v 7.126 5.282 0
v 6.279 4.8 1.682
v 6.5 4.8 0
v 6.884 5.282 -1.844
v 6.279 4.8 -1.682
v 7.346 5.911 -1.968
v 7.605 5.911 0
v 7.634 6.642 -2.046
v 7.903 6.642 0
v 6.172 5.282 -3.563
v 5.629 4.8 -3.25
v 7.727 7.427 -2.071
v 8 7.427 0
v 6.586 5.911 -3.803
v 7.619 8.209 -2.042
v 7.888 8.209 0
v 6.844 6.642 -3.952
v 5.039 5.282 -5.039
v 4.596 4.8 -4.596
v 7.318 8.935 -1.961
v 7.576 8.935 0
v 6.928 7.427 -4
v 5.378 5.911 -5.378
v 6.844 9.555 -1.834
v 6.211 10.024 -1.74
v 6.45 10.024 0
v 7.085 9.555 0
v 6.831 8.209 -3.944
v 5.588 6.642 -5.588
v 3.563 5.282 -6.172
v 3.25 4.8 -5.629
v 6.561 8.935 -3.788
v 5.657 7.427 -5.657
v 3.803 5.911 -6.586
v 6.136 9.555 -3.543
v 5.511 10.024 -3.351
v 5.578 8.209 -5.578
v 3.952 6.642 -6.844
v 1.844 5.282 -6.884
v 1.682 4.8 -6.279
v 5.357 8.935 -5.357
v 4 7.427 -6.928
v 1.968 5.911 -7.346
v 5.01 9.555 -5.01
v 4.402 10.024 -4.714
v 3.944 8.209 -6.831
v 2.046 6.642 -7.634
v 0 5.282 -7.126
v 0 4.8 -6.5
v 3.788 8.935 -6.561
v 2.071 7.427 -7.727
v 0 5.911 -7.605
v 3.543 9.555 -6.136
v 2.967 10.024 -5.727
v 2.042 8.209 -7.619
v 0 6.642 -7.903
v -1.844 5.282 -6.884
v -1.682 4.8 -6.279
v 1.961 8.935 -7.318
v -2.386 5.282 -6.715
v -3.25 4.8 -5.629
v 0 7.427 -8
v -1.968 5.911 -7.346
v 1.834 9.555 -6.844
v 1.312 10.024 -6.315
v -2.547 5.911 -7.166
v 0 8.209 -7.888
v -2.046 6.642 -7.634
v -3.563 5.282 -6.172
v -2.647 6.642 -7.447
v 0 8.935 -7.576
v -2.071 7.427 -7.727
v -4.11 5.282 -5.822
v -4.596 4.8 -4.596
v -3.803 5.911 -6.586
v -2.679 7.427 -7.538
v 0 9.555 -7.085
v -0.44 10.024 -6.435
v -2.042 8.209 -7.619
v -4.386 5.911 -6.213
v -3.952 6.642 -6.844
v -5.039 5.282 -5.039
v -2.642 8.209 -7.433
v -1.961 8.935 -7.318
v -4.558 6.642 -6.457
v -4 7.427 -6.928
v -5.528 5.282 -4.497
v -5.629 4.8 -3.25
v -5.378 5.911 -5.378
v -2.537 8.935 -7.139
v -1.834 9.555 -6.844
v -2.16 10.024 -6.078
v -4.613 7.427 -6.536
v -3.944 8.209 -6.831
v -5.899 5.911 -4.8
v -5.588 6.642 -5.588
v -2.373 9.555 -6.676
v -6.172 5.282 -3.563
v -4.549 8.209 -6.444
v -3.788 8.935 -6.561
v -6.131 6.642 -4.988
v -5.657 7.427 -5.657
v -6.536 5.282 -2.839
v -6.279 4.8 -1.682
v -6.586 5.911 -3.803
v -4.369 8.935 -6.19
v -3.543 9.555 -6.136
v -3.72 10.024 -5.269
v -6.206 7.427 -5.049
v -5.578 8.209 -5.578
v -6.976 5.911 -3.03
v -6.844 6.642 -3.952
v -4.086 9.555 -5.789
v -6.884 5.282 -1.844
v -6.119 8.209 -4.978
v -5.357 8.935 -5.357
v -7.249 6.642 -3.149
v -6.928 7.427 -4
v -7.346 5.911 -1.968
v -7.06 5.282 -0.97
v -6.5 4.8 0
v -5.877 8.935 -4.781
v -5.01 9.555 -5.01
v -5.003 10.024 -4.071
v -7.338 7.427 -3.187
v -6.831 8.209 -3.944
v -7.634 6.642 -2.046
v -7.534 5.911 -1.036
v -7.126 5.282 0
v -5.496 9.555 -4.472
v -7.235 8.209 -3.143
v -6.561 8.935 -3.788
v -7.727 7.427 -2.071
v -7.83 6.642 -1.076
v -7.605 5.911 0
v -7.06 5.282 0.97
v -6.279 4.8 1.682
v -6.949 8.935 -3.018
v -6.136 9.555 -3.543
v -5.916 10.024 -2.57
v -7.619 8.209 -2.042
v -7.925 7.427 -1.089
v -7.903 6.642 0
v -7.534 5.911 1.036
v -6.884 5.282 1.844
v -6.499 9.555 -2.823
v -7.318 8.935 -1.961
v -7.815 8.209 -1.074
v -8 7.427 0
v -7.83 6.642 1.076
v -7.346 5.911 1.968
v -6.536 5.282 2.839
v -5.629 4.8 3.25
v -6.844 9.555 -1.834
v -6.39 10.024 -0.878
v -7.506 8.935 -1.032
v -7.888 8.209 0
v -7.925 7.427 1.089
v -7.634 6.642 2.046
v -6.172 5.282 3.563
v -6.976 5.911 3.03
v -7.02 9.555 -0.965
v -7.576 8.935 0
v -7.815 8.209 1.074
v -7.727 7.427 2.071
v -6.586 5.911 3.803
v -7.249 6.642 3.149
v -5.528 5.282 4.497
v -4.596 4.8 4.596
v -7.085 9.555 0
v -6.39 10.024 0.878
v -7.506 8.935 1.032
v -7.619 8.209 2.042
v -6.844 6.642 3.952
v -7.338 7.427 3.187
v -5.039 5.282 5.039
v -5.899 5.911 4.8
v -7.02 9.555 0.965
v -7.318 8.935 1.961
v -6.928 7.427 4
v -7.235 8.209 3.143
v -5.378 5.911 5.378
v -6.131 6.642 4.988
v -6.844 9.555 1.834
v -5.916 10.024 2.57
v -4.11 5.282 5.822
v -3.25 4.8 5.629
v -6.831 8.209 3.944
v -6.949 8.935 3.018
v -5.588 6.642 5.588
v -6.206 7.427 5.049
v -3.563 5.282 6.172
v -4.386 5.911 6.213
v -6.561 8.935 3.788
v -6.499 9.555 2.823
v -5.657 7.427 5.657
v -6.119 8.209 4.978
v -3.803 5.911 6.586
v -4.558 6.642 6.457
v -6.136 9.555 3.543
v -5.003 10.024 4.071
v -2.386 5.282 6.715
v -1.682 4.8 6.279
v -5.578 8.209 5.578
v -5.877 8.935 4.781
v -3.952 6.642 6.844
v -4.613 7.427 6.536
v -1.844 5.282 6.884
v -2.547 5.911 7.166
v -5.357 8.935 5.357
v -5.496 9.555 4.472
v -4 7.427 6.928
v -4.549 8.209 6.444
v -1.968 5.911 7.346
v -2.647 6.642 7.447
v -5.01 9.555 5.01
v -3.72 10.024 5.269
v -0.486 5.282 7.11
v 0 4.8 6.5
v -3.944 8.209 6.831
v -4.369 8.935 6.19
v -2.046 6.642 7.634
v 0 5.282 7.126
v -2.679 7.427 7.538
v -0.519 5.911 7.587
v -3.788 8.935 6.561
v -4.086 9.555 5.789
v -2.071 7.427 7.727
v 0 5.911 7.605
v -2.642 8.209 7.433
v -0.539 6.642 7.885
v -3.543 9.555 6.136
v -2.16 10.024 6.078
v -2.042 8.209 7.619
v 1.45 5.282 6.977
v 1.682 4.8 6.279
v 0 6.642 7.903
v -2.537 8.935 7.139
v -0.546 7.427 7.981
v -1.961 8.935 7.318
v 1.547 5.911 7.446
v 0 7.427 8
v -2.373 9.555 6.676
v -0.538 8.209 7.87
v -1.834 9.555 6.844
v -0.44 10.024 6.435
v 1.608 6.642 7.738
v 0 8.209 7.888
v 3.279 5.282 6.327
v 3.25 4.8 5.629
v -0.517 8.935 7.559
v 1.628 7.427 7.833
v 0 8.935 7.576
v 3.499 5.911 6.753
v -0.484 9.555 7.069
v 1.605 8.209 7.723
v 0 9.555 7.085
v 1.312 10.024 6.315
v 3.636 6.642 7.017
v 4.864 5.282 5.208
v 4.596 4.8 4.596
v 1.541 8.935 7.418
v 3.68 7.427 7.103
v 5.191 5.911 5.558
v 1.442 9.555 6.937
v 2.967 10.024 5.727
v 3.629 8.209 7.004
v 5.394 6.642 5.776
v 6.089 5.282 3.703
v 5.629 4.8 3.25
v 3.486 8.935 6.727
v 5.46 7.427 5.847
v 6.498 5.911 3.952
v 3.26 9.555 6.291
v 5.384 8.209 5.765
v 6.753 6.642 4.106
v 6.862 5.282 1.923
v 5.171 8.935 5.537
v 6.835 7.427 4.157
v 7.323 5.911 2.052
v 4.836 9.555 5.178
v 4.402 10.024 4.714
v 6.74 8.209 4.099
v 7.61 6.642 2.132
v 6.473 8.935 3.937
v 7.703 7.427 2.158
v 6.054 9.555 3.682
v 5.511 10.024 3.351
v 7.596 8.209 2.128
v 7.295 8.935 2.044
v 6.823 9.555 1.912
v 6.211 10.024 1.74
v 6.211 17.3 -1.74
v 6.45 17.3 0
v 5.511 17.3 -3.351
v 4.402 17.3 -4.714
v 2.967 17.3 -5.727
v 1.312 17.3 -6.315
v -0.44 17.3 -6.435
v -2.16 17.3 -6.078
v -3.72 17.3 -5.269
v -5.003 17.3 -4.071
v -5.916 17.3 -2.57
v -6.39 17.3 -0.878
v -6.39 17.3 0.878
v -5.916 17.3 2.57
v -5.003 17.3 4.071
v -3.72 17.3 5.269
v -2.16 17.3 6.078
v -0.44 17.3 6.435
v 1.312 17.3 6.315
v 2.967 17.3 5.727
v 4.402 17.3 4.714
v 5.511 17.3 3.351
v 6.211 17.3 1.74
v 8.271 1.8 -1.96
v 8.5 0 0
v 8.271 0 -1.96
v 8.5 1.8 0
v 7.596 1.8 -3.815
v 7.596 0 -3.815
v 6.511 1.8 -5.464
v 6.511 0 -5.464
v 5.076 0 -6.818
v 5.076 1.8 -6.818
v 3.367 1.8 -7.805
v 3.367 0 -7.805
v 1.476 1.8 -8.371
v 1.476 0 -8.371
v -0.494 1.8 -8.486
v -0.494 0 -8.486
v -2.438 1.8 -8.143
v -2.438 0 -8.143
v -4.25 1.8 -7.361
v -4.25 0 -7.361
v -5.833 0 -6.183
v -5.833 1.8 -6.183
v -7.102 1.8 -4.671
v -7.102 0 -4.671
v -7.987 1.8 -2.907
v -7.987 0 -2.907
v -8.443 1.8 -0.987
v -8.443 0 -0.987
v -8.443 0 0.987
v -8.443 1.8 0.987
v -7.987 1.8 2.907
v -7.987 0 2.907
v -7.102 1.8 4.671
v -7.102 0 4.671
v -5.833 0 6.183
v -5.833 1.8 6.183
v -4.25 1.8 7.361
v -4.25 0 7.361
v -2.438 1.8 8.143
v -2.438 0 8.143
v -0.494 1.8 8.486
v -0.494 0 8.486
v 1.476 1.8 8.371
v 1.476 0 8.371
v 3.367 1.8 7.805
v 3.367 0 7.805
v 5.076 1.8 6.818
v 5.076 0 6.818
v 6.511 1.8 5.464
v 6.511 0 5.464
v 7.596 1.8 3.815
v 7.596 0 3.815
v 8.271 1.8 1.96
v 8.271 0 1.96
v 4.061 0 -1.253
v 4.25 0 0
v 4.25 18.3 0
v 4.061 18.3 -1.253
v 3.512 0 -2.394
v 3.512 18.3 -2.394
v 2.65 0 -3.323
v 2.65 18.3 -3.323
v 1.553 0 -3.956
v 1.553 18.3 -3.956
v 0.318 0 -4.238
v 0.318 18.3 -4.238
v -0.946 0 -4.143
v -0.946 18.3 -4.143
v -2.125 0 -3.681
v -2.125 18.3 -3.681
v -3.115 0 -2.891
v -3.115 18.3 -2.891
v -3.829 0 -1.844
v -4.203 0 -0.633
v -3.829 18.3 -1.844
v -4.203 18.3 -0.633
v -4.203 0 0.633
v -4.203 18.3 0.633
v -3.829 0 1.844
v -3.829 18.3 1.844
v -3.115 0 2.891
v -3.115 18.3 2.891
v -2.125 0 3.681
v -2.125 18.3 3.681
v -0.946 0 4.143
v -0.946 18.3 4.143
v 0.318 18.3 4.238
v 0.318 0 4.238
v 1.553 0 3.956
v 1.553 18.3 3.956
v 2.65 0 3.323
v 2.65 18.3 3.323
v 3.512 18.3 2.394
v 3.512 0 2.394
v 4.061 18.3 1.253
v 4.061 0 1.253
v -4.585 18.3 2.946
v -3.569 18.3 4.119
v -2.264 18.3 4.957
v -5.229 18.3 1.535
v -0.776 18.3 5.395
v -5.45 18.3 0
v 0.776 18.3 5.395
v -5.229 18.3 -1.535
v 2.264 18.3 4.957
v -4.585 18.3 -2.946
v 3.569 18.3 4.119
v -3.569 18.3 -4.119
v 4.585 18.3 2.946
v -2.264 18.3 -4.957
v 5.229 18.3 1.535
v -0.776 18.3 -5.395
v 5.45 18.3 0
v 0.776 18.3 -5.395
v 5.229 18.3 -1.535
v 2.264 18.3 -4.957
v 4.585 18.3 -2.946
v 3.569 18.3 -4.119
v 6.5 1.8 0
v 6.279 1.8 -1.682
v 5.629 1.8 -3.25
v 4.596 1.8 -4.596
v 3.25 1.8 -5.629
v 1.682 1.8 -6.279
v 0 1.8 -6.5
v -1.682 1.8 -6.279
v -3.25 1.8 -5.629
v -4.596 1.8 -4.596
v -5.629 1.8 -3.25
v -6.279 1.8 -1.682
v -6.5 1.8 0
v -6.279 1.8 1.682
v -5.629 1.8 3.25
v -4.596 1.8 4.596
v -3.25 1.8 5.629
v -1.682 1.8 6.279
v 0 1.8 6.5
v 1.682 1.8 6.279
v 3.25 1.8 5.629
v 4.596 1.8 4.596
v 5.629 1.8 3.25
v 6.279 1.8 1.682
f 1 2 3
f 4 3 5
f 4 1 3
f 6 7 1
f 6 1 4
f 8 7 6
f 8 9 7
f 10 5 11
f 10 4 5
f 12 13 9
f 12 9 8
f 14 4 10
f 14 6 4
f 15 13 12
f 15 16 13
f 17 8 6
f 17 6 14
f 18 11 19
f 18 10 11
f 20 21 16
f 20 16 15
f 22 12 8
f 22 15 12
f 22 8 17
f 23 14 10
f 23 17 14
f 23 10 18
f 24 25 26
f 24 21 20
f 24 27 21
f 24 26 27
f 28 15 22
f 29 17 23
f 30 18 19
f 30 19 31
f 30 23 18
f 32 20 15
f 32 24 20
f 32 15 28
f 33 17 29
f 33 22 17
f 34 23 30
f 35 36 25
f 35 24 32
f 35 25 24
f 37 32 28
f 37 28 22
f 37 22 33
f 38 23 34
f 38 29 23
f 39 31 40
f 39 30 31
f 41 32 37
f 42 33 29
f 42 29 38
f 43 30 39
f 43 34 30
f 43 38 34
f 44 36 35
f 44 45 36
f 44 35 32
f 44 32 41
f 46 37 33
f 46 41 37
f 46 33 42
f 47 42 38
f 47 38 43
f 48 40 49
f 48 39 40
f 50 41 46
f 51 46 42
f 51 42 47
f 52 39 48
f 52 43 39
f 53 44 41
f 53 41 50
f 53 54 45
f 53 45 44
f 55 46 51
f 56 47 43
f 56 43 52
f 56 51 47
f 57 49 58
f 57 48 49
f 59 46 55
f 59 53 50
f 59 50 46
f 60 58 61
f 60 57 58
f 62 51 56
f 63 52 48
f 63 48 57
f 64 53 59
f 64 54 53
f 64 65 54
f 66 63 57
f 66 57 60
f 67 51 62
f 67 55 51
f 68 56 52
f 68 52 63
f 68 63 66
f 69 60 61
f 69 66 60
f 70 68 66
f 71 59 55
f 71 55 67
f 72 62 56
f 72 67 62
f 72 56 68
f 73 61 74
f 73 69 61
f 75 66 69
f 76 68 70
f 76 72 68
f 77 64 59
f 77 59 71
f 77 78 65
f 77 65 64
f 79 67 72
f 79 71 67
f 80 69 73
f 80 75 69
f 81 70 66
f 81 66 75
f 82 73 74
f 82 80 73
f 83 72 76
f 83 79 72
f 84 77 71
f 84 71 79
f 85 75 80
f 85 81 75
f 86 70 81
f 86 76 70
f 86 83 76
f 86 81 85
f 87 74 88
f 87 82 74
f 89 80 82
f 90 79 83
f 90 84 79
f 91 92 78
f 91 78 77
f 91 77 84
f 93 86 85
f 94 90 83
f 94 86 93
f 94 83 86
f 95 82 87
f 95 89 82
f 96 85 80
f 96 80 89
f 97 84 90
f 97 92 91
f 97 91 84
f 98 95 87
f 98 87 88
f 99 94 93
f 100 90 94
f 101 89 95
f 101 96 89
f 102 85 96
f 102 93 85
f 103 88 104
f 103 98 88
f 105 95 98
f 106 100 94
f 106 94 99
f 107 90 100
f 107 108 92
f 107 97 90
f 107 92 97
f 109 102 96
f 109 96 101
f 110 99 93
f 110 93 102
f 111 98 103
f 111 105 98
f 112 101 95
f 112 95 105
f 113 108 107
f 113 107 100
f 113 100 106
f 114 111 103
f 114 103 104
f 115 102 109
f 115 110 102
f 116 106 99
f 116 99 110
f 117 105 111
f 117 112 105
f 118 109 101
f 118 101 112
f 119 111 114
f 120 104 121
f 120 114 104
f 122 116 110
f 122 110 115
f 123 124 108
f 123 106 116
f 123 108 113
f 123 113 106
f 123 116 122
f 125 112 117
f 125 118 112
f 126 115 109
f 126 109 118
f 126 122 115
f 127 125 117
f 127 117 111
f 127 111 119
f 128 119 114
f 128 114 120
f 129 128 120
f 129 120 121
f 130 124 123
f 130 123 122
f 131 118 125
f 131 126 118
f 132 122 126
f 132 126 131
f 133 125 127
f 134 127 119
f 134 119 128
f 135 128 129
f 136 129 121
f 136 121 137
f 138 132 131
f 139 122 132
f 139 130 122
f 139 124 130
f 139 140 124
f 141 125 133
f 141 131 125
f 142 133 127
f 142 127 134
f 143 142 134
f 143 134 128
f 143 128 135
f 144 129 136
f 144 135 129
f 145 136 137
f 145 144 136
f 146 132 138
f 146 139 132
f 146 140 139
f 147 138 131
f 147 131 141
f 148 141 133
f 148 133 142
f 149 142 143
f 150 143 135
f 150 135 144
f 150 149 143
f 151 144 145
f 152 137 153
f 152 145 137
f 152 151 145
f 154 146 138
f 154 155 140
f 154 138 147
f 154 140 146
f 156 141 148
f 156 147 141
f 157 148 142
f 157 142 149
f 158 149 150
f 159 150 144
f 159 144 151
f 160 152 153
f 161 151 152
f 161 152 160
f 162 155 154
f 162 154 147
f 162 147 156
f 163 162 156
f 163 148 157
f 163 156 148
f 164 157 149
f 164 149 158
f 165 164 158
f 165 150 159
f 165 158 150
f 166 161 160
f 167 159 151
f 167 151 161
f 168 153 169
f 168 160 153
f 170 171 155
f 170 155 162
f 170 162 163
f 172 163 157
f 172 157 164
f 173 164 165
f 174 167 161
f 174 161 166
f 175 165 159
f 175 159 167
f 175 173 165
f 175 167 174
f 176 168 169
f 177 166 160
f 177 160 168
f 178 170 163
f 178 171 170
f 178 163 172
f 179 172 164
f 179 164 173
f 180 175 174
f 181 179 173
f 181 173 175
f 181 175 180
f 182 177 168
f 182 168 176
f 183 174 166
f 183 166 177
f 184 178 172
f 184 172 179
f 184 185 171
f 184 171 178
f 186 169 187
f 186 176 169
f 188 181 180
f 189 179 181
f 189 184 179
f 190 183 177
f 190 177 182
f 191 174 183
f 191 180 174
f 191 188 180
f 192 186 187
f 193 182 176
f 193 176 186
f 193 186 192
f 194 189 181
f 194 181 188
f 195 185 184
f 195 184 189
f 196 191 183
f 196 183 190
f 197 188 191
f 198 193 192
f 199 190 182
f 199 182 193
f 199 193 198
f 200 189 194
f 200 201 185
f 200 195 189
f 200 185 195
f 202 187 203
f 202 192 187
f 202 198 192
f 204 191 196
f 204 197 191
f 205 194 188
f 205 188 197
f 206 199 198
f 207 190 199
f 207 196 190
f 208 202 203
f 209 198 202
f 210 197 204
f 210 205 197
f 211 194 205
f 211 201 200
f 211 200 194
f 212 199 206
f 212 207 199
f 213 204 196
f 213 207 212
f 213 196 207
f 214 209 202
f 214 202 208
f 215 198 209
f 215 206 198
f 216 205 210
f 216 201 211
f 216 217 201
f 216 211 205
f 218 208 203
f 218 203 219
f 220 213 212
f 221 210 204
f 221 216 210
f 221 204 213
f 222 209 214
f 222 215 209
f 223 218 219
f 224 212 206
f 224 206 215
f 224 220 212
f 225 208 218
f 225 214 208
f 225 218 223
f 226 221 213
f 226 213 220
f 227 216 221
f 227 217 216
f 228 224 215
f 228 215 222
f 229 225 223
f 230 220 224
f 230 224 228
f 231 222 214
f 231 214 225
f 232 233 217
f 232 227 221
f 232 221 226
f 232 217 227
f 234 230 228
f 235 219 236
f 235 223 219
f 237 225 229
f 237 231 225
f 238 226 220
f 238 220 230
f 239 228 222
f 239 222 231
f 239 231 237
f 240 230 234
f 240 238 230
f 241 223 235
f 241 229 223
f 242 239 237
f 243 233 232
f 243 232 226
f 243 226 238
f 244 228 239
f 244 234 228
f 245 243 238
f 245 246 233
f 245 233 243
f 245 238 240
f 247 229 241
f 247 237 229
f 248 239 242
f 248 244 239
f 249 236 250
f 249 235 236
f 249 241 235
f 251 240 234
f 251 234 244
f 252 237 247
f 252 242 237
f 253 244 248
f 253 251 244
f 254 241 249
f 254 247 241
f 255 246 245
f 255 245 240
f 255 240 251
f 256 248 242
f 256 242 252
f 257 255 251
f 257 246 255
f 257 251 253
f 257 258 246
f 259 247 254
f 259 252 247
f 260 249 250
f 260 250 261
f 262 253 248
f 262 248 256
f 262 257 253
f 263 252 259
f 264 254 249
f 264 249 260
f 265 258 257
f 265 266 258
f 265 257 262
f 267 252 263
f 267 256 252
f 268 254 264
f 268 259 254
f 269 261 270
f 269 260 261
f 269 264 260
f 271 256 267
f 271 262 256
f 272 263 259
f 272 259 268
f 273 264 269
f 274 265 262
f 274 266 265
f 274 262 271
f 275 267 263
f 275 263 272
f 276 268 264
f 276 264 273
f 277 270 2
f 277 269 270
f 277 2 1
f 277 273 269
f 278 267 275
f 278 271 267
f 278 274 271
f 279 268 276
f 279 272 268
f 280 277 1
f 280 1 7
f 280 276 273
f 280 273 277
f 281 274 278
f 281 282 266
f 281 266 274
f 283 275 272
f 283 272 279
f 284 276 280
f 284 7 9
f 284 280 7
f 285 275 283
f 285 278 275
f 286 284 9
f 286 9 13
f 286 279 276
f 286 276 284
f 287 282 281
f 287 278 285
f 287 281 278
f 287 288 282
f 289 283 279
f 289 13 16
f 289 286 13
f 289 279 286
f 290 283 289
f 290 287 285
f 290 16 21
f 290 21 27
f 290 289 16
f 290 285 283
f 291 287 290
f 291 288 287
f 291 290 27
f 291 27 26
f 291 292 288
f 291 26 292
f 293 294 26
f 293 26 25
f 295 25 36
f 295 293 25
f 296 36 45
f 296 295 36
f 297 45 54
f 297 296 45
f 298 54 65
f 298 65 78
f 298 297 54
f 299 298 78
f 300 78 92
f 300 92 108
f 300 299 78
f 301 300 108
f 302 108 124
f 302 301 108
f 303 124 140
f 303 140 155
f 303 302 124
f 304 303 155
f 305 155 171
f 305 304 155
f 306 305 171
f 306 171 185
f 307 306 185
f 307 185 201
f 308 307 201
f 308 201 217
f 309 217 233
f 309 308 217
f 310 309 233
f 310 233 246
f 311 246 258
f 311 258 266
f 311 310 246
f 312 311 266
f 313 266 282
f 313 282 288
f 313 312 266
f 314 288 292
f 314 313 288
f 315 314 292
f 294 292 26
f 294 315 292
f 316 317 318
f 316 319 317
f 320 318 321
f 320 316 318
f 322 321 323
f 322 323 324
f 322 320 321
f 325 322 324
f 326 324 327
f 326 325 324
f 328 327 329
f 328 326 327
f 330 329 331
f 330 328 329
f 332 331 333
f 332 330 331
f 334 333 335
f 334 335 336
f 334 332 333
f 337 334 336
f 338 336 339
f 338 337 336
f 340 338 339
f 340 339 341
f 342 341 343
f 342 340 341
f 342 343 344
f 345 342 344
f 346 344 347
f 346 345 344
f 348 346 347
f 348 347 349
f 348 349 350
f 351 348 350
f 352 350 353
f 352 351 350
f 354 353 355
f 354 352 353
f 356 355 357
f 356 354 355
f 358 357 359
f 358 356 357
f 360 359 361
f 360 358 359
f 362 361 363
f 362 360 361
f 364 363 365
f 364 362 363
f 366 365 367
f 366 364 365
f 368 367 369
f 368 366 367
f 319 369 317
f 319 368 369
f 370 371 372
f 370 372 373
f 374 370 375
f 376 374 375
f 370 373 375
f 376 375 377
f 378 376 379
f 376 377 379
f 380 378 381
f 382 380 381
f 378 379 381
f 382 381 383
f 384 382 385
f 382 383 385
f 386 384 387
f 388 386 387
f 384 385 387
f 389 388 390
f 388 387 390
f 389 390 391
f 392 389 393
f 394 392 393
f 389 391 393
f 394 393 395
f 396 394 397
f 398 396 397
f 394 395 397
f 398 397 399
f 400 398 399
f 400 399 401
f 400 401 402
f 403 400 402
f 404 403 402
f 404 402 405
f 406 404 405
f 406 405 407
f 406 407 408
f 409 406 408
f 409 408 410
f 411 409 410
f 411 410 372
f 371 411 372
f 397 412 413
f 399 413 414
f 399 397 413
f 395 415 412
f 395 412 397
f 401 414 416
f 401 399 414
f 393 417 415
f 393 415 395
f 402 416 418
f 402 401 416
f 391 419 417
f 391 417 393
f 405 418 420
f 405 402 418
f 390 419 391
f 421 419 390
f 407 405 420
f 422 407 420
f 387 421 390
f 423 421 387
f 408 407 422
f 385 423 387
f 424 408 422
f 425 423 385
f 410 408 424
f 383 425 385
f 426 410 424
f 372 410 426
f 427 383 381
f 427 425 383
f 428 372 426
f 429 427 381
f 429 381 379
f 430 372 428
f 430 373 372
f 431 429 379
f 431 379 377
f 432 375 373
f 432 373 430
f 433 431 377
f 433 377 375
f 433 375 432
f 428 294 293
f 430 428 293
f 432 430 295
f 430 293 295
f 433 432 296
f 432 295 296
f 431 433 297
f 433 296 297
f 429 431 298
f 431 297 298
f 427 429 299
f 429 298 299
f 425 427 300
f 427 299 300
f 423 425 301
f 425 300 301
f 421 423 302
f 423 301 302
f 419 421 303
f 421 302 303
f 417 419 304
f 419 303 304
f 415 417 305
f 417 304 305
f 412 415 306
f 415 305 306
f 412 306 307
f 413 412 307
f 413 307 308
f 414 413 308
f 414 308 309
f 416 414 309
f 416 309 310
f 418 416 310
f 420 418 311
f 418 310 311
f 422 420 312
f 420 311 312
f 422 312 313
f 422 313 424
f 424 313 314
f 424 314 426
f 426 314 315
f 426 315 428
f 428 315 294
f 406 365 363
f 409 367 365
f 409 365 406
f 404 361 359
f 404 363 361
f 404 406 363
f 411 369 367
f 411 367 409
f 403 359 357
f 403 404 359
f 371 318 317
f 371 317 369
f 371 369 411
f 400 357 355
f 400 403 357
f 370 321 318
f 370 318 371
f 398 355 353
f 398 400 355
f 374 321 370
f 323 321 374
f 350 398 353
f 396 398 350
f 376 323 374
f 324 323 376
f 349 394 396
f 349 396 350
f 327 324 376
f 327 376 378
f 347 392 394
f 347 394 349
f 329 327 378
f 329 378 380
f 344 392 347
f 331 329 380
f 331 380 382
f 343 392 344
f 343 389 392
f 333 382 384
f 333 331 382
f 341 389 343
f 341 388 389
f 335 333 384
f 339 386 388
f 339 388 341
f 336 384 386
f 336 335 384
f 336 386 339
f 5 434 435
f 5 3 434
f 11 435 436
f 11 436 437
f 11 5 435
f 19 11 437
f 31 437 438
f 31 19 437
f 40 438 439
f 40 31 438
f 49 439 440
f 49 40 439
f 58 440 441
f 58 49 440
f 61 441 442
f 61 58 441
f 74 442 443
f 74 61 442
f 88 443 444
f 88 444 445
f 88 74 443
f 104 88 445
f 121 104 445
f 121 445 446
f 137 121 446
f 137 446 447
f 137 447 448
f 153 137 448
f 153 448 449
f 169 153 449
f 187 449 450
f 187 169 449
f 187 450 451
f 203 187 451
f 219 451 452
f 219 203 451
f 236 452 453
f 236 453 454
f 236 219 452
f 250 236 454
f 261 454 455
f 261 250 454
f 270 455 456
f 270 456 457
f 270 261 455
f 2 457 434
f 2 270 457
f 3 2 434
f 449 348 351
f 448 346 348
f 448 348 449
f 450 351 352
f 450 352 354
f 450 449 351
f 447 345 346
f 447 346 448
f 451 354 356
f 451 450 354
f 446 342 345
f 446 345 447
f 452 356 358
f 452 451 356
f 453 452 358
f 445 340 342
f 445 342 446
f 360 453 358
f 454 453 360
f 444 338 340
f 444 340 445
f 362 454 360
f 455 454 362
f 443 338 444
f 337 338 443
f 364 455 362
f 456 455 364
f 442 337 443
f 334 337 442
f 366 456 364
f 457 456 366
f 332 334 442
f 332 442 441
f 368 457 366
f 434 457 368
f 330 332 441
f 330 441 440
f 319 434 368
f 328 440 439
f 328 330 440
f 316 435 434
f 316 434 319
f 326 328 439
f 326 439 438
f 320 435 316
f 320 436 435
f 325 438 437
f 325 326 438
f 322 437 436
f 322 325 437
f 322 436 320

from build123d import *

# Parameters (mm, degrees)
HOLE_WIZARD_M10_1_D     = 8.5
HOLE_WIZARD_M10_1_DEPTH = 24.5
HOLE_WIZARD_M10_1_TIP   = 2.553657631
CHAMFER_1_SIZE          = 1


with BuildPart() as part:
    # 草图1 → 旋转1 (revolve)
    with BuildSketch(Plane.XY):
        with BuildLine():
            Line((0, 0), (8.5, 0))
            Line((8.5, 0), (8.5, 1.8))
            Line((8.5, 1.8), (6.5, 1.8))
            Line((6.5, 1.8), (6.5, 4.8))
            ThreePointArc((6.5, 4.8), (7.999862618, 7.426786408), (6.45, 10.024385409))
            Line((6.45, 10.024385409), (6.45, 18.3))
            Line((6.45, 18.3), (0, 18.3))
            Line((0, 18.3), (0, 0))
        make_face()
    revolve(axis=Axis((0, 0, 0), (0, 1, 0)))

    # M10 螺纹孔1
    with Locations(Plane(origin=(0, 0, 0), x_dir=(-1, 0, 0), z_dir=(0, -1, 0))):
        with Locations((0, 0)):
            Hole(HOLE_WIZARD_M10_1_D / 2, depth=HOLE_WIZARD_M10_1_DEPTH)
            with Locations((0, 0, -(HOLE_WIZARD_M10_1_DEPTH + HOLE_WIZARD_M10_1_TIP / 2))):  # 118° drill point
                Cone(0, HOLE_WIZARD_M10_1_D / 2, HOLE_WIZARD_M10_1_TIP, mode=Mode.SUBTRACT)

    # 倒角1
    chamfer_1_edges = [part.edges().sort_by_distance(p)[0] for p in [
        (-6.45, 18.3, 0),
    ]]
    chamfer(chamfer_1_edges, length=CHAMFER_1_SIZE)


solid = part.part
